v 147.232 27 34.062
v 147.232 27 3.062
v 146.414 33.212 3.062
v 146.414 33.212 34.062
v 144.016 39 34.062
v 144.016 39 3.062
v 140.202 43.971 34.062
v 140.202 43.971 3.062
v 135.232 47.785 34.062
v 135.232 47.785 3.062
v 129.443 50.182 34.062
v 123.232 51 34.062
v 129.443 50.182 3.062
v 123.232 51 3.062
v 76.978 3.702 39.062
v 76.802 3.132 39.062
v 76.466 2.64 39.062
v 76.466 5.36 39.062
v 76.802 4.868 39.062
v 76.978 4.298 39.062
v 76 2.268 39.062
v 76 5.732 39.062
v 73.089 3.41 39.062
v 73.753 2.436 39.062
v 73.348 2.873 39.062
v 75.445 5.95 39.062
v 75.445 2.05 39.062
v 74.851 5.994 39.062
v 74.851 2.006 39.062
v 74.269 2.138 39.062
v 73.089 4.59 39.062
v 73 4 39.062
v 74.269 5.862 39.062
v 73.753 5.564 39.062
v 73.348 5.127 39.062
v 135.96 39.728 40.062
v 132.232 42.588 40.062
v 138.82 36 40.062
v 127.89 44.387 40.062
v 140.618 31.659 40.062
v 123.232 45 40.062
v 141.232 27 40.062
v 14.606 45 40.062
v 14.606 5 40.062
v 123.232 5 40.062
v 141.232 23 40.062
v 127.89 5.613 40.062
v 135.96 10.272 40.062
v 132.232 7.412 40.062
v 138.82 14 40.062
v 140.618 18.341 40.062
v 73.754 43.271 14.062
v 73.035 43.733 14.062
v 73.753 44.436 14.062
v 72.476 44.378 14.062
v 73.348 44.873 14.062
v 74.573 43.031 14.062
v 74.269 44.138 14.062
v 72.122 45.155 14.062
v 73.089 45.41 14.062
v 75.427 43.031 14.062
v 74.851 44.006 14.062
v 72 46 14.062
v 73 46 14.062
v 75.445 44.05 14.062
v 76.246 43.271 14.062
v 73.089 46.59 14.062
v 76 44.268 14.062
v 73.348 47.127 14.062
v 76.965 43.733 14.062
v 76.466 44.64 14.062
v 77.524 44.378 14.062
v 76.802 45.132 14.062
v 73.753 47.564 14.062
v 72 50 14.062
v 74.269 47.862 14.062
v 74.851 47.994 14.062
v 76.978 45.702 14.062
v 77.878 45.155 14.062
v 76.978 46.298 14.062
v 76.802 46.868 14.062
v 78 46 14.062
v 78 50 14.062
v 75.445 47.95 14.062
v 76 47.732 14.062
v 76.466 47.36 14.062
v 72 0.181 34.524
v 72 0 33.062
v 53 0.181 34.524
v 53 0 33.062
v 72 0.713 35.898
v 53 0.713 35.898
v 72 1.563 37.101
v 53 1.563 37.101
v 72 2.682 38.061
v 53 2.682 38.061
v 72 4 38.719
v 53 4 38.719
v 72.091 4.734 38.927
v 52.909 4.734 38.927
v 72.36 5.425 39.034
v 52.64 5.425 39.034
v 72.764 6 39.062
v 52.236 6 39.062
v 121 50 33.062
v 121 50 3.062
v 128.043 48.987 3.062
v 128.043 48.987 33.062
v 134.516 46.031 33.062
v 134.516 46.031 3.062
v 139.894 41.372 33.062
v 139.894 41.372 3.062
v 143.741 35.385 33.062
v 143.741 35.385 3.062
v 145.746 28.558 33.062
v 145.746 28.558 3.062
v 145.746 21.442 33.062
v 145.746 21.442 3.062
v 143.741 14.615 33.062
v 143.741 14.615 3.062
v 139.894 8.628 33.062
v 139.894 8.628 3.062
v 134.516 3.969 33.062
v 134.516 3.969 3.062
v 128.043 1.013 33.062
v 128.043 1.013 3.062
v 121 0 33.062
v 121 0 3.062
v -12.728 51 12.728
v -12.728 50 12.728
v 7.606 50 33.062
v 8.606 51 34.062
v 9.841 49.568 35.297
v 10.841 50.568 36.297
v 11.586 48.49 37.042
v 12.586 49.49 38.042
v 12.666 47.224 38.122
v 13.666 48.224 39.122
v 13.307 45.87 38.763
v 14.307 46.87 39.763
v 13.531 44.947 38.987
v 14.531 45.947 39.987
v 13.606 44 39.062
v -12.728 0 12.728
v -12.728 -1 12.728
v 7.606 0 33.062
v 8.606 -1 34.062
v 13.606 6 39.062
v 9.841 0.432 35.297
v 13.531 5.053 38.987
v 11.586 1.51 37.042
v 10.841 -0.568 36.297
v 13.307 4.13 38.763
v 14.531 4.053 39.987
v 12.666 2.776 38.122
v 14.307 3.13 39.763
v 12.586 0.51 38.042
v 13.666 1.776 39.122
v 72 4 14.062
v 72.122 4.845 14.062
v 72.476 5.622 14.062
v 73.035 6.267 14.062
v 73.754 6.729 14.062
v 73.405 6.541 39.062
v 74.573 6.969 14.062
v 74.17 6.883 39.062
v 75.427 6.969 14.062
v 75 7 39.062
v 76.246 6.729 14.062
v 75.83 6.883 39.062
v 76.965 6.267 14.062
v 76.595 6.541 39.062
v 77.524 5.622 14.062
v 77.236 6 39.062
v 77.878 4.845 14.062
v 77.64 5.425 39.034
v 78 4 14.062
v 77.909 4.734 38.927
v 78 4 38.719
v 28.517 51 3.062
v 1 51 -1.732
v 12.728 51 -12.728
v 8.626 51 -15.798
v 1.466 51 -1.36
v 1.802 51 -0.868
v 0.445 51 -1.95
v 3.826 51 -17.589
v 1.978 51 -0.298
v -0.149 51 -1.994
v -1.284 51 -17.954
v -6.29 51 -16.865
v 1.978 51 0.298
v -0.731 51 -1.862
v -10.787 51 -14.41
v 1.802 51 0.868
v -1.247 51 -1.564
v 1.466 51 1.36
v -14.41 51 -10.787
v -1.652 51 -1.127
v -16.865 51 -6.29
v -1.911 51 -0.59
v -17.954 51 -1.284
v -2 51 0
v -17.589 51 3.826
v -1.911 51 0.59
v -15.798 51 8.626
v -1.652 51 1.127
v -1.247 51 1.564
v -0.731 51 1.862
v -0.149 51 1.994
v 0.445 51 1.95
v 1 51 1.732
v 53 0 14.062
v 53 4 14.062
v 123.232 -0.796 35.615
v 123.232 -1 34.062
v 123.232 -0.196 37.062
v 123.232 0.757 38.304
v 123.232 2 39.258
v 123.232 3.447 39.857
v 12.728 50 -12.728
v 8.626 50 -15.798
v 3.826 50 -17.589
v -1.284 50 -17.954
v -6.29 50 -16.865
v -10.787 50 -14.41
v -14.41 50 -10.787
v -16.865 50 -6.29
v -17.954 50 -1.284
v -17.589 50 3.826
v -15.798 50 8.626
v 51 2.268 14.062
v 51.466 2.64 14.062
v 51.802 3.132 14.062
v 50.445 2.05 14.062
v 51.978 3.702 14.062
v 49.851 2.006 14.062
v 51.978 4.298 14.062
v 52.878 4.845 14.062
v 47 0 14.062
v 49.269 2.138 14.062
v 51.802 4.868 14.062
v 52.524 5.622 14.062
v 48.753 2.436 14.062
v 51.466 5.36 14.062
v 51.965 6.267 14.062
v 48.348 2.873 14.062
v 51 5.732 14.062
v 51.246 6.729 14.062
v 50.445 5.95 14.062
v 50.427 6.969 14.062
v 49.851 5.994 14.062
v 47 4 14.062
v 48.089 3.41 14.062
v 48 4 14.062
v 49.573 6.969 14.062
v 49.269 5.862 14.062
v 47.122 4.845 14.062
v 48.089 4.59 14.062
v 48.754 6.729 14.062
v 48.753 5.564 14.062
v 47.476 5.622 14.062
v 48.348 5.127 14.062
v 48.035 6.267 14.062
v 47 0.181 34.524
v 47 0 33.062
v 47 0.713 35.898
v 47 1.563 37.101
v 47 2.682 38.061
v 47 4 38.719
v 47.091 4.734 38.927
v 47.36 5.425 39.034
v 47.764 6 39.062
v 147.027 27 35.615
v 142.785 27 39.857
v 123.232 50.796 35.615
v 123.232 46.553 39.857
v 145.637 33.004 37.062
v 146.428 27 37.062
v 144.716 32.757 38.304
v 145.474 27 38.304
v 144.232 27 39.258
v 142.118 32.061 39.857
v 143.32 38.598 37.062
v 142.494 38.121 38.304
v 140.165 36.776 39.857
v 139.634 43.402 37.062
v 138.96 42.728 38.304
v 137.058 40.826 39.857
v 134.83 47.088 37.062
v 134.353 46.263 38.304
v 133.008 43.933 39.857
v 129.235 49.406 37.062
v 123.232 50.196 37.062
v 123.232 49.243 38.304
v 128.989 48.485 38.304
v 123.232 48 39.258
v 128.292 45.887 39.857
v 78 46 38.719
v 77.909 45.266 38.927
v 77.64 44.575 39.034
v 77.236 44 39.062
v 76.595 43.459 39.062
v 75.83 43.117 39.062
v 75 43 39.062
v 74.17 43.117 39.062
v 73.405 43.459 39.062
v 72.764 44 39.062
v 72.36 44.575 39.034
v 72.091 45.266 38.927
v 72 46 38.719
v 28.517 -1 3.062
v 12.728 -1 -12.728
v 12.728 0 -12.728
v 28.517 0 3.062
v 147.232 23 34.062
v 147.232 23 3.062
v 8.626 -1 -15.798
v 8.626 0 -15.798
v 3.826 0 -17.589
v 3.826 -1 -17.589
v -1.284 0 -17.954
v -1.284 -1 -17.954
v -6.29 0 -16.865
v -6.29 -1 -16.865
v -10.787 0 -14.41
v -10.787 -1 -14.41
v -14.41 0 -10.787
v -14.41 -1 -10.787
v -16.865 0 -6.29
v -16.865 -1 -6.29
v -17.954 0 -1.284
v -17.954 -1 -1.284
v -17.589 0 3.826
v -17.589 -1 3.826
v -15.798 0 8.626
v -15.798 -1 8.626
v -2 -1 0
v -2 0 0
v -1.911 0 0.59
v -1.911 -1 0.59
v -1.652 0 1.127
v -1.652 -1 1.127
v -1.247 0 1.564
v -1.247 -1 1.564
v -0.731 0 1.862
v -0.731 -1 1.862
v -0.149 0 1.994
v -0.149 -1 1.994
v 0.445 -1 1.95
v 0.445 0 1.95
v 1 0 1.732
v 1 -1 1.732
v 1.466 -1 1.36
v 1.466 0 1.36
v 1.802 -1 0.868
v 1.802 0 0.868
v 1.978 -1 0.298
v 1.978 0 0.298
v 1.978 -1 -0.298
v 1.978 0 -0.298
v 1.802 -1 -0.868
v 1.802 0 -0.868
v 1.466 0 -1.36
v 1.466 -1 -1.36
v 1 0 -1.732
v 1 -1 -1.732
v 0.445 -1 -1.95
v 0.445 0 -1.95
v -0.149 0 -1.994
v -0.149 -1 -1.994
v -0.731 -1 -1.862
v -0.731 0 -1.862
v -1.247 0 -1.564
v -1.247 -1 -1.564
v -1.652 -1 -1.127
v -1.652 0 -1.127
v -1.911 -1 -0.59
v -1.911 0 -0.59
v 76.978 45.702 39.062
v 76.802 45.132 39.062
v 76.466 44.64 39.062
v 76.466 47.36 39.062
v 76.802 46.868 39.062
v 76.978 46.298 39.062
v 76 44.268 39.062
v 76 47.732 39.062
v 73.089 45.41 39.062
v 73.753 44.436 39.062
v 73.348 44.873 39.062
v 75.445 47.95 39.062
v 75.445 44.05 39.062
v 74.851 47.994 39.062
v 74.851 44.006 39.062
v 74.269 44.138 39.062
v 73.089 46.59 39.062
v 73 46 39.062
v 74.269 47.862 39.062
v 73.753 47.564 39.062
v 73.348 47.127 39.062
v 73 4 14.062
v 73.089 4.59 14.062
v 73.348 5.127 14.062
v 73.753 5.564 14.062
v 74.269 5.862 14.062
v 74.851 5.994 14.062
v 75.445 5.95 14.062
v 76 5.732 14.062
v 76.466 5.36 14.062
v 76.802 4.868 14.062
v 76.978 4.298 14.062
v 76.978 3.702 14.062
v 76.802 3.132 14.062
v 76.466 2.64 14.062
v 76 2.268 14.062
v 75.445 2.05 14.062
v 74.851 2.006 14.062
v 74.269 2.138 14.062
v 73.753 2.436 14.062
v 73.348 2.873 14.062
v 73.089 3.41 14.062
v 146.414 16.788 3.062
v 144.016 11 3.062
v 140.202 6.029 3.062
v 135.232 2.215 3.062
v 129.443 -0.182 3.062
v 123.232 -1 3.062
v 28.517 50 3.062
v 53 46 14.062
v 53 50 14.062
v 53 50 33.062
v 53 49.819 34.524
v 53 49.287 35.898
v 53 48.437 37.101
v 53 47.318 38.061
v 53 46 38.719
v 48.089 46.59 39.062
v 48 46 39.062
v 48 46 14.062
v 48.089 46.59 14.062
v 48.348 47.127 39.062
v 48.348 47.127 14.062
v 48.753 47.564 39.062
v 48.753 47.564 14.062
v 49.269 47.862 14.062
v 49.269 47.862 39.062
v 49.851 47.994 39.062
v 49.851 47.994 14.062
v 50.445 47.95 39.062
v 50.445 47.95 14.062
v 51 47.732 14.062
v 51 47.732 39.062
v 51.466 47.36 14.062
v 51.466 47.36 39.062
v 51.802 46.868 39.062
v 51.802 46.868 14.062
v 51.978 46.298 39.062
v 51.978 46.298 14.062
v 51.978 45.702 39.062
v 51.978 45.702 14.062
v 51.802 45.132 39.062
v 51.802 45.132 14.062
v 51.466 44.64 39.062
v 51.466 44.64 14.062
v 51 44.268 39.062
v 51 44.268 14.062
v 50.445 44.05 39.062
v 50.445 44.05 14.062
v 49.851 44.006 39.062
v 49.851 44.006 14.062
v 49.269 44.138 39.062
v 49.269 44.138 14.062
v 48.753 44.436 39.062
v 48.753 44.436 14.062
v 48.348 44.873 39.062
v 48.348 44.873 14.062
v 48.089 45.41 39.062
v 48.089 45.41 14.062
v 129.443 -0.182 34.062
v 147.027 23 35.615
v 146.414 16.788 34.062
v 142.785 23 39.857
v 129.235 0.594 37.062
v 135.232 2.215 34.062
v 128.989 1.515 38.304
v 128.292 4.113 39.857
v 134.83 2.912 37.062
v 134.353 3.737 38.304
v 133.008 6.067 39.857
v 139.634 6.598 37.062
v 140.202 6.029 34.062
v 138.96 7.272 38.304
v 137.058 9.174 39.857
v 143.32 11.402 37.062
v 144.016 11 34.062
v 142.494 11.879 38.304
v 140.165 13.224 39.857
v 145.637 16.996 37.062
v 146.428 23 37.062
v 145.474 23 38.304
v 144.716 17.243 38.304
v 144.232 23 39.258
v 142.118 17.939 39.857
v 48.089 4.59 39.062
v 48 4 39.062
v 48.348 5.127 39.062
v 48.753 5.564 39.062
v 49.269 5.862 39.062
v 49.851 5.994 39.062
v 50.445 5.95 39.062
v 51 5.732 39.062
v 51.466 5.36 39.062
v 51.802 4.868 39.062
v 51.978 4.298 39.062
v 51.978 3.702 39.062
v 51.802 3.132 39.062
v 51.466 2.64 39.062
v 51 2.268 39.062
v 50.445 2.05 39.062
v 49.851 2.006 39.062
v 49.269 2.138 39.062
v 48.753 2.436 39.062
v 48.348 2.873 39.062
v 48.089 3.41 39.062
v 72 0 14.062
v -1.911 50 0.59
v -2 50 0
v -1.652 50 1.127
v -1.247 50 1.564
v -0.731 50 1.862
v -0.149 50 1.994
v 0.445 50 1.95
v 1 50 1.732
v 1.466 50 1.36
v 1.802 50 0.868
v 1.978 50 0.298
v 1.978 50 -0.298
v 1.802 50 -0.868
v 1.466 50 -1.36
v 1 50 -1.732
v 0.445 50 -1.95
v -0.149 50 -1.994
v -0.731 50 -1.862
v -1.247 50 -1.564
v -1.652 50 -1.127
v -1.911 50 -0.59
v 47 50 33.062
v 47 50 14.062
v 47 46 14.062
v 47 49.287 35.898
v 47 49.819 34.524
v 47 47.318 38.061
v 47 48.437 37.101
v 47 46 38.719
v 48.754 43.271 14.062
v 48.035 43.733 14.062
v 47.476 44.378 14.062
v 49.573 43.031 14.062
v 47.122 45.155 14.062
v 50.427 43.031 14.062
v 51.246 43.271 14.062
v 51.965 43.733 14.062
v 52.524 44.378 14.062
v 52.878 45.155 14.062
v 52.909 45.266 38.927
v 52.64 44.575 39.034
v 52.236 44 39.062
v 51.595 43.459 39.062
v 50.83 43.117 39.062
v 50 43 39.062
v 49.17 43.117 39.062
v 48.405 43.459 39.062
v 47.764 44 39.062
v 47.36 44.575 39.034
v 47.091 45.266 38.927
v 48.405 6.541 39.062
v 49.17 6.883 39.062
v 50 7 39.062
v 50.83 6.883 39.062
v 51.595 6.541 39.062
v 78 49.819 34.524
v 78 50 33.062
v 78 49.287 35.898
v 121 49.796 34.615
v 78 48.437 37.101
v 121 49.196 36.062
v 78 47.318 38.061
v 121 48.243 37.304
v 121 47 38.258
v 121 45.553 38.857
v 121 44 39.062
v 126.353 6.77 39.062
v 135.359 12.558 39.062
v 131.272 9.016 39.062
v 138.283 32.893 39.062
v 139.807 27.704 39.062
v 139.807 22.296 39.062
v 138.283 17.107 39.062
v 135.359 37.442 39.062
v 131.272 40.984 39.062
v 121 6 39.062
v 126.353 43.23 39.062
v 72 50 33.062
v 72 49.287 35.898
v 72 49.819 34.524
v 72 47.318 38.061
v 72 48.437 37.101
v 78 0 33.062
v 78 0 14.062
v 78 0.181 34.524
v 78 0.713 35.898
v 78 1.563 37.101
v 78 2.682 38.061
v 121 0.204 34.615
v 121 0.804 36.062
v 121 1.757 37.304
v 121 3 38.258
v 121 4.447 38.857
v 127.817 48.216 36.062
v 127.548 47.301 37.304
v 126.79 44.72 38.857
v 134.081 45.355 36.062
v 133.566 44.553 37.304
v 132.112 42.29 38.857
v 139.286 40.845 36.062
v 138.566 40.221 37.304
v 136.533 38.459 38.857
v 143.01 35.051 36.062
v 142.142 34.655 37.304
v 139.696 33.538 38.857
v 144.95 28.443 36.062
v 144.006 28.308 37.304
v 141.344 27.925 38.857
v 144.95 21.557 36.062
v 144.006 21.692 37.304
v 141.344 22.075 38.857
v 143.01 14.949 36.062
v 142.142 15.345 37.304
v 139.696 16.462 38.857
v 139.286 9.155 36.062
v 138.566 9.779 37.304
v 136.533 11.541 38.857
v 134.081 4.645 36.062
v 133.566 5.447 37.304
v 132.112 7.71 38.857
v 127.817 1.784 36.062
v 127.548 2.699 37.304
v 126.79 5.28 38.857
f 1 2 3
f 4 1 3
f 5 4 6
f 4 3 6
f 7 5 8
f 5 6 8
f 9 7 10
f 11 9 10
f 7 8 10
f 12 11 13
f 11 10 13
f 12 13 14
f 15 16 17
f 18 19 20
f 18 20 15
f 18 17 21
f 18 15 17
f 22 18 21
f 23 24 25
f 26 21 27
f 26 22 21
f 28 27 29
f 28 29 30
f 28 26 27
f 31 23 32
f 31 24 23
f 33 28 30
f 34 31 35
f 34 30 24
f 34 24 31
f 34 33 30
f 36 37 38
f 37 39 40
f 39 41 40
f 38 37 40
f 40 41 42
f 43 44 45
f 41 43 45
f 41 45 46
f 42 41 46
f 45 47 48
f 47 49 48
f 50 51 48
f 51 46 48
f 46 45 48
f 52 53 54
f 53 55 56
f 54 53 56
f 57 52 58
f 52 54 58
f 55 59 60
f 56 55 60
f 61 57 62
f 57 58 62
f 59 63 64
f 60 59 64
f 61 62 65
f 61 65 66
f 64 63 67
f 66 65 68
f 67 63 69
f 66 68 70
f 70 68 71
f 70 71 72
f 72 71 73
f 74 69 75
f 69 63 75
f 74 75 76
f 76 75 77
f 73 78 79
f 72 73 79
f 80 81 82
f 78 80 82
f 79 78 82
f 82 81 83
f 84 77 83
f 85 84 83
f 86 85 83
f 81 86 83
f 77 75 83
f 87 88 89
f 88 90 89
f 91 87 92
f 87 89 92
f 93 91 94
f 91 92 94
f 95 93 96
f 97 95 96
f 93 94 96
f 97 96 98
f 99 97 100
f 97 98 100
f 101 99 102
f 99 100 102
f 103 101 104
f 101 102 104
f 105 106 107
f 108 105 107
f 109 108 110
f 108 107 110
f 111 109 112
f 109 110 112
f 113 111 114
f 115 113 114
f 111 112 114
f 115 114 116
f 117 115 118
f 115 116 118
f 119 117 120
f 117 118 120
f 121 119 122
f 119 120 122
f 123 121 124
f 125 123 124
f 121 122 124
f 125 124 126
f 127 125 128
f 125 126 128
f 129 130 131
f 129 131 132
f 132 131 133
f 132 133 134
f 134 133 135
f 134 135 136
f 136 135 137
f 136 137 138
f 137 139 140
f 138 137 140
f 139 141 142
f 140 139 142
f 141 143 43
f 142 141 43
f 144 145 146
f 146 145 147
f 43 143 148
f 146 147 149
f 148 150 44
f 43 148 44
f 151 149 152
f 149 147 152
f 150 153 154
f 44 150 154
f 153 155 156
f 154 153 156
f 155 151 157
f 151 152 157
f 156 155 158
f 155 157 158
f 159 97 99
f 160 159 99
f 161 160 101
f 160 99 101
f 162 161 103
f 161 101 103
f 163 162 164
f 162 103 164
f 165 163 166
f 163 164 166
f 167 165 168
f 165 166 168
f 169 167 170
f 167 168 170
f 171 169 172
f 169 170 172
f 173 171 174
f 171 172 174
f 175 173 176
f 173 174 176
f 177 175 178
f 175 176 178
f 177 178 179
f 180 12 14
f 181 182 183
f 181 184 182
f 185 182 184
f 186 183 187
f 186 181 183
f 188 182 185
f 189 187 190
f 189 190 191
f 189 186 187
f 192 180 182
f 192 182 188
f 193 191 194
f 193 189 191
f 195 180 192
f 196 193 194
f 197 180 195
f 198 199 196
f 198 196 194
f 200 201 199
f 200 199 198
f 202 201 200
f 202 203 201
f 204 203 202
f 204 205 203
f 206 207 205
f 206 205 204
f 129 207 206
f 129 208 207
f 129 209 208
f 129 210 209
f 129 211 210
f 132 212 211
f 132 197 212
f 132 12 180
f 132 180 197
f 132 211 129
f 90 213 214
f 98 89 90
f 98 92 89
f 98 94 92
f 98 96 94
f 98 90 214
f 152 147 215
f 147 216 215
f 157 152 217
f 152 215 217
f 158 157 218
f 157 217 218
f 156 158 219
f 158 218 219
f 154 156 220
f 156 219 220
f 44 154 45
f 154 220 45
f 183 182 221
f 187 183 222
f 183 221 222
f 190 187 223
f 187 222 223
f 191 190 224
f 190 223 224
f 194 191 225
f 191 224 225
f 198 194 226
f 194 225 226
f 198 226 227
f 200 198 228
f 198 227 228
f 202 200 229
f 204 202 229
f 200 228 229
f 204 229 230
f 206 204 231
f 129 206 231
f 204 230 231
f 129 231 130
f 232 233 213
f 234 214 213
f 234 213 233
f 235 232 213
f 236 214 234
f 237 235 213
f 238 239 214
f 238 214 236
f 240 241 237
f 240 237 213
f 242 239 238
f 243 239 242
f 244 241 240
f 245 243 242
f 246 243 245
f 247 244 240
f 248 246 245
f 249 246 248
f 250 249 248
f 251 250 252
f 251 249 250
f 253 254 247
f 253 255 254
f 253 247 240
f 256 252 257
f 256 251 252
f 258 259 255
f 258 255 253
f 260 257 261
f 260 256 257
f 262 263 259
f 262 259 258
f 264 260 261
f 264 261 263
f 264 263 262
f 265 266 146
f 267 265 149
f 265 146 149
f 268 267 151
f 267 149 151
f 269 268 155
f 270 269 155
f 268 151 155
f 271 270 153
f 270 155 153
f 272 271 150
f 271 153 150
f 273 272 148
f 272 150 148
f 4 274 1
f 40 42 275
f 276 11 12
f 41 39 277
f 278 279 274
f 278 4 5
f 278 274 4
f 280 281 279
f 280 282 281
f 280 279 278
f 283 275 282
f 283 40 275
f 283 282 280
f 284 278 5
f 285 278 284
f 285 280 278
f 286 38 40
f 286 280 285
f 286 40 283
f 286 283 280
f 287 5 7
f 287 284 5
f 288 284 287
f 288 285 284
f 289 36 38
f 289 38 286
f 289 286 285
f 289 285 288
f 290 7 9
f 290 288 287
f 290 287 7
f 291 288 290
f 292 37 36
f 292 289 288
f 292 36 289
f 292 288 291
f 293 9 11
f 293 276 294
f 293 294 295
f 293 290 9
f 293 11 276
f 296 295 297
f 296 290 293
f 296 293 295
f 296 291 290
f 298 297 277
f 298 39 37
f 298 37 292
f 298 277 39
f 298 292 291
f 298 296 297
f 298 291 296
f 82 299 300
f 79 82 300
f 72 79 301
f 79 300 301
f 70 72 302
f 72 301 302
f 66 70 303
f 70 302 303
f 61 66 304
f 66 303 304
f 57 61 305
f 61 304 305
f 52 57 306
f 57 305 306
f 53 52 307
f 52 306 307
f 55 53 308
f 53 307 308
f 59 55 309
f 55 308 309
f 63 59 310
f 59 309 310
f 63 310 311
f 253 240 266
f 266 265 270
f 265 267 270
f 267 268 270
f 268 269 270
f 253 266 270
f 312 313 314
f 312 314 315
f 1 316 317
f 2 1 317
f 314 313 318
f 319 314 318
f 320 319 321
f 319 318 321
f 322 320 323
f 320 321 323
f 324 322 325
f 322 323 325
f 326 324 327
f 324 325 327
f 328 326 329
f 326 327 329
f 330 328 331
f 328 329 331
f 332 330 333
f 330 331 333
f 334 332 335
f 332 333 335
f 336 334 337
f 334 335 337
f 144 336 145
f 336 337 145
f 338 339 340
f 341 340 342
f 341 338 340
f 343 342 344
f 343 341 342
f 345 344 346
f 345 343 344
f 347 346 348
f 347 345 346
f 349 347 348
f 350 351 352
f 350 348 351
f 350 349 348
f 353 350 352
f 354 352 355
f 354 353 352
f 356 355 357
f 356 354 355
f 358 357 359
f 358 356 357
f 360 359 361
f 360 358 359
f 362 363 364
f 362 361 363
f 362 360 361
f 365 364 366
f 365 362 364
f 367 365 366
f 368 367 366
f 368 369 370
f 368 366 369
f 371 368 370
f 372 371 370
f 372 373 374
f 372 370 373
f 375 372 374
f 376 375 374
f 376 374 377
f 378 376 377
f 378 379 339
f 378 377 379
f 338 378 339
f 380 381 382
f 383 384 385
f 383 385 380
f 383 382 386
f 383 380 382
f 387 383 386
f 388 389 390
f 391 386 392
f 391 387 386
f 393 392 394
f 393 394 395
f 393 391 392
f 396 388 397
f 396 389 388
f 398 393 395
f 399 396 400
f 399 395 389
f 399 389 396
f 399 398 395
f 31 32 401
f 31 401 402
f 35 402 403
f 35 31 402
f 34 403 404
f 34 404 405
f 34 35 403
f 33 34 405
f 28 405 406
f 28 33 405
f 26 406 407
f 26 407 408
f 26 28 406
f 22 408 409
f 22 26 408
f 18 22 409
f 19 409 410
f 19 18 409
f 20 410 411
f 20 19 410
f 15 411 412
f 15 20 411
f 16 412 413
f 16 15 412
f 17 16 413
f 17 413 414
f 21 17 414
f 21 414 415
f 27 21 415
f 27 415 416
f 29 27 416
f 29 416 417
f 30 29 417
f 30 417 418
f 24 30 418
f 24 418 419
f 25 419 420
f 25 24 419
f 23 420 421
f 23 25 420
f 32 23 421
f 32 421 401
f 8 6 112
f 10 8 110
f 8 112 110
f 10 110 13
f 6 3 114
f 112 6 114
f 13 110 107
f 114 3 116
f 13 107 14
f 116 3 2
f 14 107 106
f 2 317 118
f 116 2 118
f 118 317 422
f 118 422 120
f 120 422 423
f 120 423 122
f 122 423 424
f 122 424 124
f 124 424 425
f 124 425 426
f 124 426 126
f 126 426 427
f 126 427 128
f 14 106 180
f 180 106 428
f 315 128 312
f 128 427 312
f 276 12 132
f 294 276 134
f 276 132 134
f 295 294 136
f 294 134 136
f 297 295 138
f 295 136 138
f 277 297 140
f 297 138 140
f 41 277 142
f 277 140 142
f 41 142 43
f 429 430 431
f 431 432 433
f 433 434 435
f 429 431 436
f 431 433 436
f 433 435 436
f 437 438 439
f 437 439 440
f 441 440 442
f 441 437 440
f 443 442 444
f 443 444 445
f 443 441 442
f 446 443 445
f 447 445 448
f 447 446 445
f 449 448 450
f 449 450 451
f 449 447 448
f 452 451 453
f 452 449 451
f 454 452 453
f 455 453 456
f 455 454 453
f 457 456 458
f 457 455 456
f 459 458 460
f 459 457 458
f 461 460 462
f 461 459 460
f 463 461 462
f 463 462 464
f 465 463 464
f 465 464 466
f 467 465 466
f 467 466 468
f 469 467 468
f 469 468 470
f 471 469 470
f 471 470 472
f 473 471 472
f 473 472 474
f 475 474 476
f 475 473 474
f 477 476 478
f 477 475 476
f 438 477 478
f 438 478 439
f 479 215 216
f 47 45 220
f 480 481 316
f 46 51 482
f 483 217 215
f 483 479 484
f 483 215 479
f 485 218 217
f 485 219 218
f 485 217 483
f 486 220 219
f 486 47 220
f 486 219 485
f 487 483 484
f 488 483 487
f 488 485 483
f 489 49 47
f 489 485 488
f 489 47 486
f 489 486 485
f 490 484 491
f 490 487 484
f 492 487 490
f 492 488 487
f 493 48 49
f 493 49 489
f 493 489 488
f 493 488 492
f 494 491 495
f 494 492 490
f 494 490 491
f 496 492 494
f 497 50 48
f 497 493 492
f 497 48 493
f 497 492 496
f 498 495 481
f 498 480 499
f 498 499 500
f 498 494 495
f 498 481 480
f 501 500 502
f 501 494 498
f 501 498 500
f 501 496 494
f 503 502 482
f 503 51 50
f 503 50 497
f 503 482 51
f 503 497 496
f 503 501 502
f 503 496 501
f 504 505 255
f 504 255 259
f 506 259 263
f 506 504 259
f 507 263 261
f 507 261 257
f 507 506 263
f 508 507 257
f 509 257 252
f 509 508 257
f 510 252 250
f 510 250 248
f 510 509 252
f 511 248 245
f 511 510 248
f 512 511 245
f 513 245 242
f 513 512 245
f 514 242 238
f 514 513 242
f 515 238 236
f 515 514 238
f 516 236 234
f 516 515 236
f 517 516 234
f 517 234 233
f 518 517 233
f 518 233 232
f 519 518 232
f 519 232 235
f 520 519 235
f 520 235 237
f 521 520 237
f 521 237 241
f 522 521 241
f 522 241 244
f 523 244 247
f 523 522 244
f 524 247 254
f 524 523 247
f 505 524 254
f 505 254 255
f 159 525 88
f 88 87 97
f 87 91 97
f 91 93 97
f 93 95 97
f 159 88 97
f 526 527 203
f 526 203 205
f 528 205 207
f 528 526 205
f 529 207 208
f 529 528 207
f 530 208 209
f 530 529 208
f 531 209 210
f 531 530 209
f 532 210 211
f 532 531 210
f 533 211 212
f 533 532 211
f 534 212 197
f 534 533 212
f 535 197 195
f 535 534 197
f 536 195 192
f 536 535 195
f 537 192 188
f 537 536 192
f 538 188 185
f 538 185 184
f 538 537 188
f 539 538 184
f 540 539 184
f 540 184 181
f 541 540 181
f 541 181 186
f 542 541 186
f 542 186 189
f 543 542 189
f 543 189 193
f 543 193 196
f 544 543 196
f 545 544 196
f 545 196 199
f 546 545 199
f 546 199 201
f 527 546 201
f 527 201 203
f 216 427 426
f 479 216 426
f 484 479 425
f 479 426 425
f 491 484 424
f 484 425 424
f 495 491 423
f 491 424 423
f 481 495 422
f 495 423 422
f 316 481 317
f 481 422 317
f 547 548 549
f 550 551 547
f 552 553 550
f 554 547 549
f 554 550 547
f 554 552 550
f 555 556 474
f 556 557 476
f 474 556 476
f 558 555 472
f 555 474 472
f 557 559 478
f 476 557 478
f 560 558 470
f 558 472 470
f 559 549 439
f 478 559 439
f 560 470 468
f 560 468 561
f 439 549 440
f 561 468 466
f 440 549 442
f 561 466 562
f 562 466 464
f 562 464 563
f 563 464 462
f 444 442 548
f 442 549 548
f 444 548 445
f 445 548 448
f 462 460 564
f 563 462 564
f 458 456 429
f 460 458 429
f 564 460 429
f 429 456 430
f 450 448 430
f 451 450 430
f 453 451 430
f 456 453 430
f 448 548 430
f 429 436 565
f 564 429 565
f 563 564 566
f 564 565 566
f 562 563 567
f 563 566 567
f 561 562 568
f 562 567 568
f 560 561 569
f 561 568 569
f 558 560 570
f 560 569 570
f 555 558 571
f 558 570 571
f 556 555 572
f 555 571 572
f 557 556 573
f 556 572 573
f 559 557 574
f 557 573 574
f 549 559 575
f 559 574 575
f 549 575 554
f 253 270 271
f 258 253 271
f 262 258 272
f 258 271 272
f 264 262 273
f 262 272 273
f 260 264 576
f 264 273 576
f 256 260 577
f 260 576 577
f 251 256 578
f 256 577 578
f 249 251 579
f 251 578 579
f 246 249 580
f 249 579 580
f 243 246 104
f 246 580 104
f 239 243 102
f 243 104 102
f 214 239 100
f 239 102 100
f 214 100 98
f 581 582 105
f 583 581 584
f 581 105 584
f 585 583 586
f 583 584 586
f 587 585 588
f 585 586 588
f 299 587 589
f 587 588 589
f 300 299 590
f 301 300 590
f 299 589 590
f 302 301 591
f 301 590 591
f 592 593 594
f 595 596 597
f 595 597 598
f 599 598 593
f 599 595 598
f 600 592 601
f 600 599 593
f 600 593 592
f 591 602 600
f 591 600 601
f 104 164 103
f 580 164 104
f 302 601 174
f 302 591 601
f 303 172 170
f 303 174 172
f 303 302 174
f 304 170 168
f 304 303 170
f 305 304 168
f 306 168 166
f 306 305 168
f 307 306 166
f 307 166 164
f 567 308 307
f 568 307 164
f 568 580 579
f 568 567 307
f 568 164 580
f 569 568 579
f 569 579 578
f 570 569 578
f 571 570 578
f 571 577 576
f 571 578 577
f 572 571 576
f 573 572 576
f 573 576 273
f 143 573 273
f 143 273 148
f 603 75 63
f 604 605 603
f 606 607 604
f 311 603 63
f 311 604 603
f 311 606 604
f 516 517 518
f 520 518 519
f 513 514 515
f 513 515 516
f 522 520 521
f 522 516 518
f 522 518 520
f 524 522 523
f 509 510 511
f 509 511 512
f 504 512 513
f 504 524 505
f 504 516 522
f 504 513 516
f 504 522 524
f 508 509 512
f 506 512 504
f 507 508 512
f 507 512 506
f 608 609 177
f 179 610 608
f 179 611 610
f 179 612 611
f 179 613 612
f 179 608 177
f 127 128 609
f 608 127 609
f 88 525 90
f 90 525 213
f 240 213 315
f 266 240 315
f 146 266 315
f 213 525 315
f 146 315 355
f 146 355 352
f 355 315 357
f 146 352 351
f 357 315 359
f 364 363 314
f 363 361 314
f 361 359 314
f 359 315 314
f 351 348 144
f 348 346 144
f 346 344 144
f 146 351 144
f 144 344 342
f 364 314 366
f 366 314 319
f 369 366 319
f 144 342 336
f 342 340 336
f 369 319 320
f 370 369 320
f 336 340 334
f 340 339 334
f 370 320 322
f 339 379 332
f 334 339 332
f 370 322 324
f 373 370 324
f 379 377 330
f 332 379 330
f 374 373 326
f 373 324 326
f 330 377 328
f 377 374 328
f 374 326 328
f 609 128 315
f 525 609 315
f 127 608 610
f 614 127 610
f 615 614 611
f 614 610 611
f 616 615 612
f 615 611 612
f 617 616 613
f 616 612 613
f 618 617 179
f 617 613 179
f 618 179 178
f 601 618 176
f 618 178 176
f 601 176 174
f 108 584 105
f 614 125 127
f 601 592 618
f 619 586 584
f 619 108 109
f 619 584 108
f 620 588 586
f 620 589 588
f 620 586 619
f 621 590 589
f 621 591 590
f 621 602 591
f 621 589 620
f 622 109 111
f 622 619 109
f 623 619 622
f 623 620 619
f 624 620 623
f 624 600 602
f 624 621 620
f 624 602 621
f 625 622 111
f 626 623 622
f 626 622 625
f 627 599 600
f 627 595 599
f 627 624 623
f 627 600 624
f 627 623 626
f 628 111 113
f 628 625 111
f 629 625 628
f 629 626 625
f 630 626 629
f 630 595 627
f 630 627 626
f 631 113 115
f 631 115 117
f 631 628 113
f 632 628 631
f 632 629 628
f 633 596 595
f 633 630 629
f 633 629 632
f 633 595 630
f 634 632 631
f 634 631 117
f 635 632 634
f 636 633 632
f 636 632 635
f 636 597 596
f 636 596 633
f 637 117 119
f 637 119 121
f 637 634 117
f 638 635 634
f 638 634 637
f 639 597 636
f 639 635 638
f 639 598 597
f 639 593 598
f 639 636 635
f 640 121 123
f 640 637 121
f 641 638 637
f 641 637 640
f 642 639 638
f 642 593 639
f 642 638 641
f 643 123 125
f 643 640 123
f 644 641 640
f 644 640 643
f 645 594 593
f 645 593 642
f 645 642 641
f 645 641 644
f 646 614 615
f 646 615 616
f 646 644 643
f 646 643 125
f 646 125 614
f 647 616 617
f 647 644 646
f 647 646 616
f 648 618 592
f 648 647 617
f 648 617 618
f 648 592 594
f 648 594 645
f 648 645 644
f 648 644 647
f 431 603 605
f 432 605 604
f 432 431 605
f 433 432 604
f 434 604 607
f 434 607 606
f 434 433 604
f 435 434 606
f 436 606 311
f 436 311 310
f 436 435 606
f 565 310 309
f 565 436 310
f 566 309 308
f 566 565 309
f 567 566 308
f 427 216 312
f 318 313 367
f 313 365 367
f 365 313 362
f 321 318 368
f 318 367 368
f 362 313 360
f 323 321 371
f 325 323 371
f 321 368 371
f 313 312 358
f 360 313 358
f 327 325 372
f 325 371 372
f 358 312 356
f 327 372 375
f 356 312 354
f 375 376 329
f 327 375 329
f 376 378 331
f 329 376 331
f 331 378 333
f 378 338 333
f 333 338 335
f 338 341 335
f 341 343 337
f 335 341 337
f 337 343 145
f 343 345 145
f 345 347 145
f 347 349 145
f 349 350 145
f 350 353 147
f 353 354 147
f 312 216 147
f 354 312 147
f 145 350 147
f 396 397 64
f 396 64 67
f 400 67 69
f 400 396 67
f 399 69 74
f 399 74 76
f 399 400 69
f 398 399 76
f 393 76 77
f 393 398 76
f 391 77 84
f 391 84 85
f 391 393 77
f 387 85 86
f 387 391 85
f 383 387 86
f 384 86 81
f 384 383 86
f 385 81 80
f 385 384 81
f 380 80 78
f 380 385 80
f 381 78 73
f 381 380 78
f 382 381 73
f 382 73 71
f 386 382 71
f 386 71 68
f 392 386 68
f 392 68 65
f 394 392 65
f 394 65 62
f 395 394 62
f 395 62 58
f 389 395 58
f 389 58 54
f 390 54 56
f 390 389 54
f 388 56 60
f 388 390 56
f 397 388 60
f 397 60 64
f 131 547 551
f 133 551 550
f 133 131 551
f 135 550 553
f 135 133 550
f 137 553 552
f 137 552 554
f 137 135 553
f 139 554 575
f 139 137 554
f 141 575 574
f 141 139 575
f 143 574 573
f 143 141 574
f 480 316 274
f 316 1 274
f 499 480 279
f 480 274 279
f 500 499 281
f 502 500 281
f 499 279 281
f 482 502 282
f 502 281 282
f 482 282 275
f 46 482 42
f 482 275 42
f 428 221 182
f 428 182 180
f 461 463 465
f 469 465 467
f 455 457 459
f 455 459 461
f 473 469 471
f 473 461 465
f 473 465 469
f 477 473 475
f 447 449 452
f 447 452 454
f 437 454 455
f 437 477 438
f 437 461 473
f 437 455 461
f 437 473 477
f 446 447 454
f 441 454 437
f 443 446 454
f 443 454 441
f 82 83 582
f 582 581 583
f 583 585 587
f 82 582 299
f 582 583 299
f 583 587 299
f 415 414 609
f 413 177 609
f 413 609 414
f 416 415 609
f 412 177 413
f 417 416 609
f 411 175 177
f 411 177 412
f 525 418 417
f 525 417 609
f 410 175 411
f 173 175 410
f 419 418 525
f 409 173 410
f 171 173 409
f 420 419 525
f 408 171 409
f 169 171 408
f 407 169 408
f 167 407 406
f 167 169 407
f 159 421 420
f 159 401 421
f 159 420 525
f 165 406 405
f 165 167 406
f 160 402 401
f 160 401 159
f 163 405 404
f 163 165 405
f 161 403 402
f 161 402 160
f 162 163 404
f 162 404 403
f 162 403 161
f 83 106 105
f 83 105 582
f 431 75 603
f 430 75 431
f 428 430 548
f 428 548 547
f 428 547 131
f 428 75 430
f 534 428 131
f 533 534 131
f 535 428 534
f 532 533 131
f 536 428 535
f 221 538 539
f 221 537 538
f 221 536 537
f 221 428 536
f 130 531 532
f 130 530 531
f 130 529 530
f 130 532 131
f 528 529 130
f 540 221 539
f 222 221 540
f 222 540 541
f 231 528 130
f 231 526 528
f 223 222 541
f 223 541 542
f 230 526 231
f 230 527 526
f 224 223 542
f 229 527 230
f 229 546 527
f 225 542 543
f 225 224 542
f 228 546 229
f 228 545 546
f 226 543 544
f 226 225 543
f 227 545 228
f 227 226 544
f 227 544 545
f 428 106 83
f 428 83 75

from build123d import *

# Parameters (mm, degrees)
SKETCH025_R             = 2
PAD015_DEPTH            = 52
POCKET009_DEPTH         = 60
SKETCH045_R             = 2
PAD026_DEPTH            = 25
LINEARPATTERN_COUNT     = 2
LINEARPATTERN_PITCH     = 25
FILLET005_R             = 24
FILLET006_R             = 6
BODY003_PLACEMENT_ANGLE = 180


with BuildPart() as part:
    # Sketch025 → Pad015 (new body)
    with BuildSketch(Plane.XZ):
        with BuildLine():
            ThreePointArc((-12.7279264704, -12.7279176523), (12.7279198568, -12.7279242659), (12.7279220614, 12.7279220614))
            Line((12.7279220614, 12.7279220614), (-14.605821279, 40.061665402))
            Line((-14.605821279, 40.061665402), (-147.231723, 40.061665402))
            Line((-147.231723, 40.061665402), (-147.231723, 3.061665402))
            Line((-147.231723, 3.061665402), (-28.5174940448, 3.061665402))
            Line((-12.7279264704, -12.7279176523), (-28.5174940448, 3.061665402))
        make_face()
        Circle(SKETCH025_R, mode=Mode.SUBTRACT)
    extrude(amount=PAD015_DEPTH)

    # Sketch026 (on Face5 of Pad015) → Pocket009 (cut)
    with BuildSketch(Plane(origin=(0, 0, -20.938334598), x_dir=(1, 0, 0), z_dir=(0, 0, -1))):
        with BuildLine():
            ThreePointArc((-121, 51), (-146, 26), (-121, 1))
            Line((-121, 1), (79, 1))
            ThreePointArc((79, 1), (104, 26), (79, 51))
            Line((-121, 51), (79, 51))
        make_face()
    extrude(amount=-POCKET009_DEPTH, mode=Mode.SUBTRACT)

    # Sketch045 (on Face13 of Pocket009) → Pad026 (join)
    with BuildSketch(Plane(origin=(0, 0, 39.061665402), x_dir=(1, 0, 0), z_dir=(0, 0, -1))):
        with BuildLine():
            Line((-47, 1), (-47, 5))
            ThreePointArc((-47, 5), (-50, 8), (-53, 5))
            Line((-53, 1), (-53, 5))
            Line((-47, 1), (-53, 1))
        make_face()
        with Locations((-50, 5)):
            Circle(SKETCH045_R, mode=Mode.SUBTRACT)
        with BuildLine():
            Line((-47, 51), (-47, 47))
            ThreePointArc((-53, 47), (-50, 44), (-47, 47))
            Line((-53, 51), (-53, 47))
            Line((-47, 51), (-53, 51))
        make_face()
        with Locations((-50, 47)):
            Circle(SKETCH045_R, mode=Mode.SUBTRACT)
    pad026 = extrude(amount=PAD026_DEPTH)

    # LinearPattern: Pad026 ×2
    with Locations(*[(-i * LINEARPATTERN_PITCH, 0, 0) for i in range(1, LINEARPATTERN_COUNT)]):
        add(pad026)

    # Fillet005
    fillet005_edges = [part.edges().sort_by_distance(p)[0] for p in [
        (-147.231723, 0, 21.561665),
        (-147.231723, -52, 21.561665),
    ]]
    fillet(fillet005_edges, radius=FILLET005_R)

    # Fillet006
    fillet006_edges = [part.edges().sort_by_distance(p)[0] for p in [
        (-68.918772, 0, 40.061665),
        (-140.202286, -7.029437, 40.061665),
        (-147.231723, -26, 40.061665),
        (-140.202286, -44.970563, 40.061665),
        (-68.918772, -52, 40.061665),
        (-146, -26, 39.061665),
        (-99.5, -51, 39.061665),
        (-62.5, -51, 39.061665),
        (-30.302911, -51, 39.061665),
        (-30.302911, -1, 39.061665),
        (-62.5, -1, 39.061665),
        (-99.5, -1, 39.061665),
    ]]
    fillet(fillet006_edges, radius=FILLET006_R)


with BuildPart() as part_1:
    # Body003 placement: moved
    add(part.part.moved(Location((0, -1, 0))).rotate(Axis((0, -1, 0), (0, 0, 1)), BODY003_PLACEMENT_ANGLE))


solid = part_1.part
